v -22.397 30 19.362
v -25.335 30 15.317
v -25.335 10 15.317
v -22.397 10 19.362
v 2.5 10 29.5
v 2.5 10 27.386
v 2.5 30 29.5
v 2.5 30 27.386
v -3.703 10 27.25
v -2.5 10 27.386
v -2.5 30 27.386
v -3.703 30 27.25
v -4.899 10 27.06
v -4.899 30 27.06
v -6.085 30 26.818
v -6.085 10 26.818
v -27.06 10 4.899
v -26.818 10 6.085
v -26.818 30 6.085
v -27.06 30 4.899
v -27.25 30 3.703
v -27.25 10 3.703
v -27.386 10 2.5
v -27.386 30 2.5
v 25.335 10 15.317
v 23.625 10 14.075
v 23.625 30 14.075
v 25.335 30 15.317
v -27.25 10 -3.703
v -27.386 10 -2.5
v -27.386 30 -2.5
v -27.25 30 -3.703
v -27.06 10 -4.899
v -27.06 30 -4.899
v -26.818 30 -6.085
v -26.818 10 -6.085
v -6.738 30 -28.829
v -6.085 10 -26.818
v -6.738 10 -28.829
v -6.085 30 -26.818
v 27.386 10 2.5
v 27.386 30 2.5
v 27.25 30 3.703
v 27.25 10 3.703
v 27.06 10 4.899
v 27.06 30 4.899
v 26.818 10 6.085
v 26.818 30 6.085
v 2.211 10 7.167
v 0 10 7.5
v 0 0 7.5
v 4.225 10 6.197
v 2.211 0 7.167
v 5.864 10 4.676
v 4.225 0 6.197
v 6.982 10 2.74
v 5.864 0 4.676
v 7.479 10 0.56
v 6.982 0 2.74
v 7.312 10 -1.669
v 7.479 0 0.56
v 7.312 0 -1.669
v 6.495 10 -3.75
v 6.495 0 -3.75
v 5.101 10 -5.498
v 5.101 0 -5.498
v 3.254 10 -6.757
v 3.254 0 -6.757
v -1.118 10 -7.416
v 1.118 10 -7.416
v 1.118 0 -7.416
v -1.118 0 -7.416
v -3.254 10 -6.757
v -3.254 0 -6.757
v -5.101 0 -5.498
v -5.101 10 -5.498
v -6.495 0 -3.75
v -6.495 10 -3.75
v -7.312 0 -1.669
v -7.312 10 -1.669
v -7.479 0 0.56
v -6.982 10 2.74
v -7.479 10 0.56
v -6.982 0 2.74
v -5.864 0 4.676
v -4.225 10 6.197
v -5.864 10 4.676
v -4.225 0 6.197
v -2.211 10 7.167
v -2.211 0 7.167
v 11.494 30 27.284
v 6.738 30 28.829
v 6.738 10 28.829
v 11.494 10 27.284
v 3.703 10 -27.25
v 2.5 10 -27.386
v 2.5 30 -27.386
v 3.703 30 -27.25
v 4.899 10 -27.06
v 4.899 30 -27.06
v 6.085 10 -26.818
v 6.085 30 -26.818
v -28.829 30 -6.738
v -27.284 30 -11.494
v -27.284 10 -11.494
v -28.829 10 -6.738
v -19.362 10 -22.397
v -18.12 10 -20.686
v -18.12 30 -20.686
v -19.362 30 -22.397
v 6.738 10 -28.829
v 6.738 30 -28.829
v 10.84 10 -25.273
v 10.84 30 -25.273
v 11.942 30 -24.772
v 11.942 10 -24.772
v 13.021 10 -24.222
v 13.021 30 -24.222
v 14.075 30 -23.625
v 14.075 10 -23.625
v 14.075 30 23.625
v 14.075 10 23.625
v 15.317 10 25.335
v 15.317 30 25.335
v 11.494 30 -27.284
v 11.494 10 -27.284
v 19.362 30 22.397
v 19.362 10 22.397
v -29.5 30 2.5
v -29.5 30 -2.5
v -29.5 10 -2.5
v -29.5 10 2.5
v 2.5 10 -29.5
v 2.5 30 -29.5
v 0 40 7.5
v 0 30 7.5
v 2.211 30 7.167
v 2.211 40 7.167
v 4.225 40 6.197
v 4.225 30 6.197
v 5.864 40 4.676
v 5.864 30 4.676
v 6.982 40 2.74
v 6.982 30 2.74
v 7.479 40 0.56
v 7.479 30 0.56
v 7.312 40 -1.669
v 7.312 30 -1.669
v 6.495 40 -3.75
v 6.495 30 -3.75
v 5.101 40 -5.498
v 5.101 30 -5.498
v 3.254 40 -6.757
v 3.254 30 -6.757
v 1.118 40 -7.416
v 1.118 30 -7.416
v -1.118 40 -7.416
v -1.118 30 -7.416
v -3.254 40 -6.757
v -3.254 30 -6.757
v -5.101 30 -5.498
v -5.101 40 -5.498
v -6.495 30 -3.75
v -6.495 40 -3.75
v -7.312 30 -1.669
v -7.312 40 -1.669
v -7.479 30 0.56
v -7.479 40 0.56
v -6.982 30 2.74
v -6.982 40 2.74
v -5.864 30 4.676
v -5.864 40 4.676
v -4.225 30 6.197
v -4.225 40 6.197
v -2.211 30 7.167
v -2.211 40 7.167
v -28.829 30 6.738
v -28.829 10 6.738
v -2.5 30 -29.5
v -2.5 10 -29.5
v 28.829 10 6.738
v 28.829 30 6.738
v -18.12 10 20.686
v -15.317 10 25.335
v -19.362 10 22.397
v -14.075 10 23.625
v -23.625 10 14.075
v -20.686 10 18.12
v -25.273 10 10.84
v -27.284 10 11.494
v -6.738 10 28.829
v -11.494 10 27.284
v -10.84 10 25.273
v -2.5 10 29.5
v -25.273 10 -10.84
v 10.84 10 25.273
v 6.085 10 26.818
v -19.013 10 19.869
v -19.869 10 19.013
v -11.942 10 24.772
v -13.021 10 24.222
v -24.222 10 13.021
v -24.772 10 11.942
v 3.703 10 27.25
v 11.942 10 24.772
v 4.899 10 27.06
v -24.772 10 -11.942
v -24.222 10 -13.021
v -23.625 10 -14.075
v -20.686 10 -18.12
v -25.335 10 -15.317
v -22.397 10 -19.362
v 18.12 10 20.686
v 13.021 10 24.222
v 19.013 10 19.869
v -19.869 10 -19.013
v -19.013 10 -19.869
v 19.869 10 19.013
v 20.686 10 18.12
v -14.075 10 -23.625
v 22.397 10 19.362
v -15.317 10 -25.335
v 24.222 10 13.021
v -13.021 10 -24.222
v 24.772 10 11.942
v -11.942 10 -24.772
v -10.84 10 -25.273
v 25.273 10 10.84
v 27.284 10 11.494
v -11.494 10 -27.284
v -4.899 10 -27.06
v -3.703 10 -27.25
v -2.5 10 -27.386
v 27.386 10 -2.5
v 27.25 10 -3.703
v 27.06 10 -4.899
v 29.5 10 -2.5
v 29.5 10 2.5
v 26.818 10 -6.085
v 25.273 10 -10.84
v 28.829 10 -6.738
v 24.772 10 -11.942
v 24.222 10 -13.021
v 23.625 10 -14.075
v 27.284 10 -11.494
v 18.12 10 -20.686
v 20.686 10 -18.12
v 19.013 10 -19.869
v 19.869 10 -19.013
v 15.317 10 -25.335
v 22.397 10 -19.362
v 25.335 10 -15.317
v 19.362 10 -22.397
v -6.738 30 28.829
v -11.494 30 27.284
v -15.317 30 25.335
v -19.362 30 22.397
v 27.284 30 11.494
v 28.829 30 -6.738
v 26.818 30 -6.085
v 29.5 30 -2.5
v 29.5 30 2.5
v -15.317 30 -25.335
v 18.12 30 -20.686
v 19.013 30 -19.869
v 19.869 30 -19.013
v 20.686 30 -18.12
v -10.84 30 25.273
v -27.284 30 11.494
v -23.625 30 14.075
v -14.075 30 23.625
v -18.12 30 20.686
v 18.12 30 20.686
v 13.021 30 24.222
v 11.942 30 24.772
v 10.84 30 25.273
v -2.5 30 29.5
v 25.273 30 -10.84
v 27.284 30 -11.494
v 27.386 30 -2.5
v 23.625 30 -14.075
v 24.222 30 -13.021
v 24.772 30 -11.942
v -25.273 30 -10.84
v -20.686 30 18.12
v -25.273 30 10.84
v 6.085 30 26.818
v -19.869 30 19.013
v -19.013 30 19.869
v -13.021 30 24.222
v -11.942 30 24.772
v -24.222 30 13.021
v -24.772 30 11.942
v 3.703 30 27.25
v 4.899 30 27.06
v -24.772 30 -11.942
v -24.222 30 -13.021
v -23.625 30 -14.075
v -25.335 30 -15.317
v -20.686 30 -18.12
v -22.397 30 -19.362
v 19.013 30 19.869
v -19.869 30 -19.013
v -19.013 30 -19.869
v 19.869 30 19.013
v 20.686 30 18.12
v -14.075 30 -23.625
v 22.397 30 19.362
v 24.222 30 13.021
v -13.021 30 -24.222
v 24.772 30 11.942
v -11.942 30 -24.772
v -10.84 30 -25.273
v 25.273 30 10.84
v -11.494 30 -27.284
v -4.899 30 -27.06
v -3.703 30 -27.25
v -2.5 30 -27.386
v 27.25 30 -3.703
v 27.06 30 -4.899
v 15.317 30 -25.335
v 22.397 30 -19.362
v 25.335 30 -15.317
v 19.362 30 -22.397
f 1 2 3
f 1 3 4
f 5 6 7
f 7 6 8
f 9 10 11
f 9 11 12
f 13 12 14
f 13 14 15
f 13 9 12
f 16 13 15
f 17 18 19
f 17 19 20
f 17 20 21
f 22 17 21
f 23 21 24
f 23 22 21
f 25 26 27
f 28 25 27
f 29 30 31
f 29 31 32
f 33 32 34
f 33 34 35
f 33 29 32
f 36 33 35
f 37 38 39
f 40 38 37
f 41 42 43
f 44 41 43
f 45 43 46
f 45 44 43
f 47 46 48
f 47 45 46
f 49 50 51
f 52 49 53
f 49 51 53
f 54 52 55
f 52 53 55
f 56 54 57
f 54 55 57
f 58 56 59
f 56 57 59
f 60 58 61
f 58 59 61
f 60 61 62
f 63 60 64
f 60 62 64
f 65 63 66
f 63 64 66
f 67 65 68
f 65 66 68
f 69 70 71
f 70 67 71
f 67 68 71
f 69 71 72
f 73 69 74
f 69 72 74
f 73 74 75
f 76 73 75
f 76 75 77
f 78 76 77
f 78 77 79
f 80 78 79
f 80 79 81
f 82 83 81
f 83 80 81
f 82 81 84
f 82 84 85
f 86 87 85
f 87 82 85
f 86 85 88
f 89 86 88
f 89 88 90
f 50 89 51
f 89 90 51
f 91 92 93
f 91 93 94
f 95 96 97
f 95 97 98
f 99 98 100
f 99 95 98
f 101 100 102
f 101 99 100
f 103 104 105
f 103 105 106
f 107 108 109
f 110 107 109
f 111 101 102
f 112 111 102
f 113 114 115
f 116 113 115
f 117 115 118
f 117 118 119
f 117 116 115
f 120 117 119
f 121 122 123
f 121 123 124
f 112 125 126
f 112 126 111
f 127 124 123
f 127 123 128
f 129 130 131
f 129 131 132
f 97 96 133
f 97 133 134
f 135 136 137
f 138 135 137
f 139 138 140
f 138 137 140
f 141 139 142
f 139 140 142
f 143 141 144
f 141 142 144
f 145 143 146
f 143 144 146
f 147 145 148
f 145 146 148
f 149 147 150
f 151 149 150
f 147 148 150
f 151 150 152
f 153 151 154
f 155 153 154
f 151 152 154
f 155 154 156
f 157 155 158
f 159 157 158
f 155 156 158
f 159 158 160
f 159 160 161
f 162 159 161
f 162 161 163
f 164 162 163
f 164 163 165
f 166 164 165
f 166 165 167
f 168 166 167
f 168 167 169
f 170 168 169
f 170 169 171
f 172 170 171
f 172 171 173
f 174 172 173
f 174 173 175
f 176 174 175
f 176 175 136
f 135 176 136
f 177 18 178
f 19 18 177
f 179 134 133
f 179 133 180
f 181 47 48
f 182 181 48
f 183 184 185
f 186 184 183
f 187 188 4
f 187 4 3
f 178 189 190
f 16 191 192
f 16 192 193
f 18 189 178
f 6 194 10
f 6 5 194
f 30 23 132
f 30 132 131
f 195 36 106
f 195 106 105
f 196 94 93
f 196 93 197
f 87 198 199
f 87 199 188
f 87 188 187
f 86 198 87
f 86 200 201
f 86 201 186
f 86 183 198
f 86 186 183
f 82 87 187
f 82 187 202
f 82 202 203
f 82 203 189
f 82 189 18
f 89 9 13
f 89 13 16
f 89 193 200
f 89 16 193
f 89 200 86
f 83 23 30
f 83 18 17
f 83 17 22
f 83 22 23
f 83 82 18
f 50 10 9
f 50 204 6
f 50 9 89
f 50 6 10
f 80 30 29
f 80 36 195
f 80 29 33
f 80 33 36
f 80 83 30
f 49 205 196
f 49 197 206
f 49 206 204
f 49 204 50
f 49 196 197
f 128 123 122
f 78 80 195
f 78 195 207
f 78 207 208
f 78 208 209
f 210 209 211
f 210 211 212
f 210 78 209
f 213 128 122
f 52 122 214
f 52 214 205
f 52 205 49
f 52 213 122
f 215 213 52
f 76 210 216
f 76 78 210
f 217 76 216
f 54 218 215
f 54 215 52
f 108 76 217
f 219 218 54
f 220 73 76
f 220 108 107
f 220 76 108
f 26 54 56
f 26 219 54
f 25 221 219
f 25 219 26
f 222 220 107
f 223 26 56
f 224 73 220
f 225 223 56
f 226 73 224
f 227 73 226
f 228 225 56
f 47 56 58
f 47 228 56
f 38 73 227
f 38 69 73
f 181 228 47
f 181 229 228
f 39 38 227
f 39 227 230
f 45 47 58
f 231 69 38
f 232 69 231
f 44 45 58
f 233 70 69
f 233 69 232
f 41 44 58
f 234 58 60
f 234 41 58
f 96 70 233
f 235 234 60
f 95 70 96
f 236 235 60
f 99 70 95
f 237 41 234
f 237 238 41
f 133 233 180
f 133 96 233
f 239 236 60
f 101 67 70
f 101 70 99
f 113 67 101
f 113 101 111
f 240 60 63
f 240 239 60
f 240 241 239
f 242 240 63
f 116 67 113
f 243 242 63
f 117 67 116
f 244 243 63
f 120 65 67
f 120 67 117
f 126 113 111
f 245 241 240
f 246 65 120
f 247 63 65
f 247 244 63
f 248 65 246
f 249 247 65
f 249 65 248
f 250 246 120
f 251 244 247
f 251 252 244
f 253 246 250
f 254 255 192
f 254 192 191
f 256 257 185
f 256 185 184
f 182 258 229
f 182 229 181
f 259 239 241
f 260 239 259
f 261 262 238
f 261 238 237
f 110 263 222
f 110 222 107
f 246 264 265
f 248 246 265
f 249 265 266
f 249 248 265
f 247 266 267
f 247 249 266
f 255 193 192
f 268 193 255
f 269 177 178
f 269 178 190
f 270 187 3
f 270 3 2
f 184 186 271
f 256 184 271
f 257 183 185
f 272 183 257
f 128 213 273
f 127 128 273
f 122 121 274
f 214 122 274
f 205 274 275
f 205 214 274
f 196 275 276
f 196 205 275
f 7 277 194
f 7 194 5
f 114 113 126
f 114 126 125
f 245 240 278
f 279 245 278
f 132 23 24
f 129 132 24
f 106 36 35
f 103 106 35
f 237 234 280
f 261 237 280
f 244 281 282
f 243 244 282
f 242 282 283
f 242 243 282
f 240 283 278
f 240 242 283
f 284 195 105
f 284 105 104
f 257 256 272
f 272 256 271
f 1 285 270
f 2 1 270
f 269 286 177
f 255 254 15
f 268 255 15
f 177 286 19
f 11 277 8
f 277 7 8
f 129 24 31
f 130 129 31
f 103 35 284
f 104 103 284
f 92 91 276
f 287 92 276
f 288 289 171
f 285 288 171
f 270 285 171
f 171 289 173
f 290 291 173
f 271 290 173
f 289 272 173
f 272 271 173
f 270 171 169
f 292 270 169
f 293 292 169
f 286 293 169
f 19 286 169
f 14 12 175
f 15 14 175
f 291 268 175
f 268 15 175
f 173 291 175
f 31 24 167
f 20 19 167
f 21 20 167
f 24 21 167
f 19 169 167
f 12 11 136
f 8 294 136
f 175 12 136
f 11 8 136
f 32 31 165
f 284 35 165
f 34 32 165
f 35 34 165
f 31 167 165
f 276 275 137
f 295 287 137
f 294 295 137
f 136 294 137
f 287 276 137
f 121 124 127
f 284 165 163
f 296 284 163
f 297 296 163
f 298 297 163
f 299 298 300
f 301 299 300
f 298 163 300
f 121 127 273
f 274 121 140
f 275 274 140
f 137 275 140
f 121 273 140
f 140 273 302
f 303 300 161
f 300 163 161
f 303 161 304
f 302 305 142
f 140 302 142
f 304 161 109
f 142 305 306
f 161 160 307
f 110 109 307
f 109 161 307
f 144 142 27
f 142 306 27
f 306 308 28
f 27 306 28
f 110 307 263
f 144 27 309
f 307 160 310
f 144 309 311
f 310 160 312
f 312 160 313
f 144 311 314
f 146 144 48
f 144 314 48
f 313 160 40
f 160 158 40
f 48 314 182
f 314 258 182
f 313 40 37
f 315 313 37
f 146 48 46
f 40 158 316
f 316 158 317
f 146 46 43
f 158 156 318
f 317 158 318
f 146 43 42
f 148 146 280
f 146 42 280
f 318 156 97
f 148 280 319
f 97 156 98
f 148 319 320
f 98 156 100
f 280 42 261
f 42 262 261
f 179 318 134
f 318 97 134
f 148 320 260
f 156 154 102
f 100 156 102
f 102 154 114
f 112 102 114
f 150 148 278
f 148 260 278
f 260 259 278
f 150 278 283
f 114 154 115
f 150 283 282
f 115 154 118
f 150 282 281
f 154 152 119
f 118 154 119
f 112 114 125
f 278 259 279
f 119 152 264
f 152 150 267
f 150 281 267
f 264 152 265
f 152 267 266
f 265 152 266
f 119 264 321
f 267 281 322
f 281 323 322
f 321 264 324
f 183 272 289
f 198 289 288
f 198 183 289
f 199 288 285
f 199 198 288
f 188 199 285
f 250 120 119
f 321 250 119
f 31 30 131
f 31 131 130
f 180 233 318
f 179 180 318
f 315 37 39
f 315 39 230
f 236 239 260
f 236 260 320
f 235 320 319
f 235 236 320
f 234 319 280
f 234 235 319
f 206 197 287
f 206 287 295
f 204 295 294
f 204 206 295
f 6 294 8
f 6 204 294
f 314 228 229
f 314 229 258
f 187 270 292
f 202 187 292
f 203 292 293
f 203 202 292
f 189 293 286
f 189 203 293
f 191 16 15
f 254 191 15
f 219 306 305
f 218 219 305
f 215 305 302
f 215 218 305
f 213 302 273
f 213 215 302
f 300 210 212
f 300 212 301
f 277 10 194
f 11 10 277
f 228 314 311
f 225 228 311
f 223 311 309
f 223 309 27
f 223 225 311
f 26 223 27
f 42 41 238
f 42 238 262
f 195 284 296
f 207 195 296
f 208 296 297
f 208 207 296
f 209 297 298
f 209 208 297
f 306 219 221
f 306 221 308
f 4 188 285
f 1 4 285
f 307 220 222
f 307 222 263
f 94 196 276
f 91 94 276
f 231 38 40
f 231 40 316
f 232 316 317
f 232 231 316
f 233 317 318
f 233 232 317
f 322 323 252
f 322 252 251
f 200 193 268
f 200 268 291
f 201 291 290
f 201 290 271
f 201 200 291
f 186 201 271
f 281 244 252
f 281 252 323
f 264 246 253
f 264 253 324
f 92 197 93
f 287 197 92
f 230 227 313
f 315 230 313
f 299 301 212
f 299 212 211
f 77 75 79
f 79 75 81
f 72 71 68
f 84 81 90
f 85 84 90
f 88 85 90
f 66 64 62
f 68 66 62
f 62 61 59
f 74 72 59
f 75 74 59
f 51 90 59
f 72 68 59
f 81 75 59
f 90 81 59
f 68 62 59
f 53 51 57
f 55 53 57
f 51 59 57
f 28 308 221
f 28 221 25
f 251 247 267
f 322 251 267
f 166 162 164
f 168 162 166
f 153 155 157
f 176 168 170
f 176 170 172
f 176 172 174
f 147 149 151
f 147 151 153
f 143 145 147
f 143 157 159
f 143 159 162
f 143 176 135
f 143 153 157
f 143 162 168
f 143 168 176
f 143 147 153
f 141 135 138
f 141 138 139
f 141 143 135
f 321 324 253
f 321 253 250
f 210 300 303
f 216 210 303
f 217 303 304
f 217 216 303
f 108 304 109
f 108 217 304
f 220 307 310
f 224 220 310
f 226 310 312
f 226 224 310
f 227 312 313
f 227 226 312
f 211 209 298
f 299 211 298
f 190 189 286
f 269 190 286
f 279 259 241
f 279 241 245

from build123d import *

# Parameters (mm, degrees)
ESQUISSE1_R                  = 7.5
BOSS_EXTRU_1_DEPTH           = 40
ESQUISSE2_R                  = 27.5
BOSS_EXTRU_2_DEPTH           = 20
ESQUISSE3_W                  = 5
ESQUISSE3_H                  = 20
BOSS_EXTRU_3_DEPTH           = 7
R_P_TITION_CIRCULAIRE1_COUNT = 20


with BuildPart() as part:
    # Esquisse1 → Boss.-Extru.1 (new body)
    with BuildSketch(Plane(origin=(0, 0, 0), x_dir=(1, 0, 0), z_dir=(0, 1, 0))):
        with Locations(Location((0, 0, 0), (0, 0, 270))):
            Circle(ESQUISSE1_R)
    extrude(amount=BOSS_EXTRU_1_DEPTH)

    # Esquisse2 → Boss.-Extru.2 (add)
    with BuildSketch(Plane(origin=(0, 10, 0), x_dir=(-1, 0, 0), z_dir=(0, -1, 0))):
        with Locations(Location((0, 0, 0), (0, 0, 90))):
            Circle(ESQUISSE2_R)
    extrude(amount=-BOSS_EXTRU_2_DEPTH)

    # Esquisse3 → Boss.-Extru.3 (add)
    with BuildSketch(Plane.XY.offset(22.5)):
        with Locations((0, 20)):
            Rectangle(ESQUISSE3_W, ESQUISSE3_H)
    boss_extru_3 = extrude(amount=BOSS_EXTRU_3_DEPTH)

    # Répétition circulaire1: Boss.-Extru.3 ×20 about axis
    r_p_tition_circulaire1_axis = Axis((0, 0, 0), (0, 1, 0))
    for i in range(1, R_P_TITION_CIRCULAIRE1_COUNT):
        add(boss_extru_3.rotate(r_p_tition_circulaire1_axis, i * 360 / R_P_TITION_CIRCULAIRE1_COUNT))


solid = part.part
